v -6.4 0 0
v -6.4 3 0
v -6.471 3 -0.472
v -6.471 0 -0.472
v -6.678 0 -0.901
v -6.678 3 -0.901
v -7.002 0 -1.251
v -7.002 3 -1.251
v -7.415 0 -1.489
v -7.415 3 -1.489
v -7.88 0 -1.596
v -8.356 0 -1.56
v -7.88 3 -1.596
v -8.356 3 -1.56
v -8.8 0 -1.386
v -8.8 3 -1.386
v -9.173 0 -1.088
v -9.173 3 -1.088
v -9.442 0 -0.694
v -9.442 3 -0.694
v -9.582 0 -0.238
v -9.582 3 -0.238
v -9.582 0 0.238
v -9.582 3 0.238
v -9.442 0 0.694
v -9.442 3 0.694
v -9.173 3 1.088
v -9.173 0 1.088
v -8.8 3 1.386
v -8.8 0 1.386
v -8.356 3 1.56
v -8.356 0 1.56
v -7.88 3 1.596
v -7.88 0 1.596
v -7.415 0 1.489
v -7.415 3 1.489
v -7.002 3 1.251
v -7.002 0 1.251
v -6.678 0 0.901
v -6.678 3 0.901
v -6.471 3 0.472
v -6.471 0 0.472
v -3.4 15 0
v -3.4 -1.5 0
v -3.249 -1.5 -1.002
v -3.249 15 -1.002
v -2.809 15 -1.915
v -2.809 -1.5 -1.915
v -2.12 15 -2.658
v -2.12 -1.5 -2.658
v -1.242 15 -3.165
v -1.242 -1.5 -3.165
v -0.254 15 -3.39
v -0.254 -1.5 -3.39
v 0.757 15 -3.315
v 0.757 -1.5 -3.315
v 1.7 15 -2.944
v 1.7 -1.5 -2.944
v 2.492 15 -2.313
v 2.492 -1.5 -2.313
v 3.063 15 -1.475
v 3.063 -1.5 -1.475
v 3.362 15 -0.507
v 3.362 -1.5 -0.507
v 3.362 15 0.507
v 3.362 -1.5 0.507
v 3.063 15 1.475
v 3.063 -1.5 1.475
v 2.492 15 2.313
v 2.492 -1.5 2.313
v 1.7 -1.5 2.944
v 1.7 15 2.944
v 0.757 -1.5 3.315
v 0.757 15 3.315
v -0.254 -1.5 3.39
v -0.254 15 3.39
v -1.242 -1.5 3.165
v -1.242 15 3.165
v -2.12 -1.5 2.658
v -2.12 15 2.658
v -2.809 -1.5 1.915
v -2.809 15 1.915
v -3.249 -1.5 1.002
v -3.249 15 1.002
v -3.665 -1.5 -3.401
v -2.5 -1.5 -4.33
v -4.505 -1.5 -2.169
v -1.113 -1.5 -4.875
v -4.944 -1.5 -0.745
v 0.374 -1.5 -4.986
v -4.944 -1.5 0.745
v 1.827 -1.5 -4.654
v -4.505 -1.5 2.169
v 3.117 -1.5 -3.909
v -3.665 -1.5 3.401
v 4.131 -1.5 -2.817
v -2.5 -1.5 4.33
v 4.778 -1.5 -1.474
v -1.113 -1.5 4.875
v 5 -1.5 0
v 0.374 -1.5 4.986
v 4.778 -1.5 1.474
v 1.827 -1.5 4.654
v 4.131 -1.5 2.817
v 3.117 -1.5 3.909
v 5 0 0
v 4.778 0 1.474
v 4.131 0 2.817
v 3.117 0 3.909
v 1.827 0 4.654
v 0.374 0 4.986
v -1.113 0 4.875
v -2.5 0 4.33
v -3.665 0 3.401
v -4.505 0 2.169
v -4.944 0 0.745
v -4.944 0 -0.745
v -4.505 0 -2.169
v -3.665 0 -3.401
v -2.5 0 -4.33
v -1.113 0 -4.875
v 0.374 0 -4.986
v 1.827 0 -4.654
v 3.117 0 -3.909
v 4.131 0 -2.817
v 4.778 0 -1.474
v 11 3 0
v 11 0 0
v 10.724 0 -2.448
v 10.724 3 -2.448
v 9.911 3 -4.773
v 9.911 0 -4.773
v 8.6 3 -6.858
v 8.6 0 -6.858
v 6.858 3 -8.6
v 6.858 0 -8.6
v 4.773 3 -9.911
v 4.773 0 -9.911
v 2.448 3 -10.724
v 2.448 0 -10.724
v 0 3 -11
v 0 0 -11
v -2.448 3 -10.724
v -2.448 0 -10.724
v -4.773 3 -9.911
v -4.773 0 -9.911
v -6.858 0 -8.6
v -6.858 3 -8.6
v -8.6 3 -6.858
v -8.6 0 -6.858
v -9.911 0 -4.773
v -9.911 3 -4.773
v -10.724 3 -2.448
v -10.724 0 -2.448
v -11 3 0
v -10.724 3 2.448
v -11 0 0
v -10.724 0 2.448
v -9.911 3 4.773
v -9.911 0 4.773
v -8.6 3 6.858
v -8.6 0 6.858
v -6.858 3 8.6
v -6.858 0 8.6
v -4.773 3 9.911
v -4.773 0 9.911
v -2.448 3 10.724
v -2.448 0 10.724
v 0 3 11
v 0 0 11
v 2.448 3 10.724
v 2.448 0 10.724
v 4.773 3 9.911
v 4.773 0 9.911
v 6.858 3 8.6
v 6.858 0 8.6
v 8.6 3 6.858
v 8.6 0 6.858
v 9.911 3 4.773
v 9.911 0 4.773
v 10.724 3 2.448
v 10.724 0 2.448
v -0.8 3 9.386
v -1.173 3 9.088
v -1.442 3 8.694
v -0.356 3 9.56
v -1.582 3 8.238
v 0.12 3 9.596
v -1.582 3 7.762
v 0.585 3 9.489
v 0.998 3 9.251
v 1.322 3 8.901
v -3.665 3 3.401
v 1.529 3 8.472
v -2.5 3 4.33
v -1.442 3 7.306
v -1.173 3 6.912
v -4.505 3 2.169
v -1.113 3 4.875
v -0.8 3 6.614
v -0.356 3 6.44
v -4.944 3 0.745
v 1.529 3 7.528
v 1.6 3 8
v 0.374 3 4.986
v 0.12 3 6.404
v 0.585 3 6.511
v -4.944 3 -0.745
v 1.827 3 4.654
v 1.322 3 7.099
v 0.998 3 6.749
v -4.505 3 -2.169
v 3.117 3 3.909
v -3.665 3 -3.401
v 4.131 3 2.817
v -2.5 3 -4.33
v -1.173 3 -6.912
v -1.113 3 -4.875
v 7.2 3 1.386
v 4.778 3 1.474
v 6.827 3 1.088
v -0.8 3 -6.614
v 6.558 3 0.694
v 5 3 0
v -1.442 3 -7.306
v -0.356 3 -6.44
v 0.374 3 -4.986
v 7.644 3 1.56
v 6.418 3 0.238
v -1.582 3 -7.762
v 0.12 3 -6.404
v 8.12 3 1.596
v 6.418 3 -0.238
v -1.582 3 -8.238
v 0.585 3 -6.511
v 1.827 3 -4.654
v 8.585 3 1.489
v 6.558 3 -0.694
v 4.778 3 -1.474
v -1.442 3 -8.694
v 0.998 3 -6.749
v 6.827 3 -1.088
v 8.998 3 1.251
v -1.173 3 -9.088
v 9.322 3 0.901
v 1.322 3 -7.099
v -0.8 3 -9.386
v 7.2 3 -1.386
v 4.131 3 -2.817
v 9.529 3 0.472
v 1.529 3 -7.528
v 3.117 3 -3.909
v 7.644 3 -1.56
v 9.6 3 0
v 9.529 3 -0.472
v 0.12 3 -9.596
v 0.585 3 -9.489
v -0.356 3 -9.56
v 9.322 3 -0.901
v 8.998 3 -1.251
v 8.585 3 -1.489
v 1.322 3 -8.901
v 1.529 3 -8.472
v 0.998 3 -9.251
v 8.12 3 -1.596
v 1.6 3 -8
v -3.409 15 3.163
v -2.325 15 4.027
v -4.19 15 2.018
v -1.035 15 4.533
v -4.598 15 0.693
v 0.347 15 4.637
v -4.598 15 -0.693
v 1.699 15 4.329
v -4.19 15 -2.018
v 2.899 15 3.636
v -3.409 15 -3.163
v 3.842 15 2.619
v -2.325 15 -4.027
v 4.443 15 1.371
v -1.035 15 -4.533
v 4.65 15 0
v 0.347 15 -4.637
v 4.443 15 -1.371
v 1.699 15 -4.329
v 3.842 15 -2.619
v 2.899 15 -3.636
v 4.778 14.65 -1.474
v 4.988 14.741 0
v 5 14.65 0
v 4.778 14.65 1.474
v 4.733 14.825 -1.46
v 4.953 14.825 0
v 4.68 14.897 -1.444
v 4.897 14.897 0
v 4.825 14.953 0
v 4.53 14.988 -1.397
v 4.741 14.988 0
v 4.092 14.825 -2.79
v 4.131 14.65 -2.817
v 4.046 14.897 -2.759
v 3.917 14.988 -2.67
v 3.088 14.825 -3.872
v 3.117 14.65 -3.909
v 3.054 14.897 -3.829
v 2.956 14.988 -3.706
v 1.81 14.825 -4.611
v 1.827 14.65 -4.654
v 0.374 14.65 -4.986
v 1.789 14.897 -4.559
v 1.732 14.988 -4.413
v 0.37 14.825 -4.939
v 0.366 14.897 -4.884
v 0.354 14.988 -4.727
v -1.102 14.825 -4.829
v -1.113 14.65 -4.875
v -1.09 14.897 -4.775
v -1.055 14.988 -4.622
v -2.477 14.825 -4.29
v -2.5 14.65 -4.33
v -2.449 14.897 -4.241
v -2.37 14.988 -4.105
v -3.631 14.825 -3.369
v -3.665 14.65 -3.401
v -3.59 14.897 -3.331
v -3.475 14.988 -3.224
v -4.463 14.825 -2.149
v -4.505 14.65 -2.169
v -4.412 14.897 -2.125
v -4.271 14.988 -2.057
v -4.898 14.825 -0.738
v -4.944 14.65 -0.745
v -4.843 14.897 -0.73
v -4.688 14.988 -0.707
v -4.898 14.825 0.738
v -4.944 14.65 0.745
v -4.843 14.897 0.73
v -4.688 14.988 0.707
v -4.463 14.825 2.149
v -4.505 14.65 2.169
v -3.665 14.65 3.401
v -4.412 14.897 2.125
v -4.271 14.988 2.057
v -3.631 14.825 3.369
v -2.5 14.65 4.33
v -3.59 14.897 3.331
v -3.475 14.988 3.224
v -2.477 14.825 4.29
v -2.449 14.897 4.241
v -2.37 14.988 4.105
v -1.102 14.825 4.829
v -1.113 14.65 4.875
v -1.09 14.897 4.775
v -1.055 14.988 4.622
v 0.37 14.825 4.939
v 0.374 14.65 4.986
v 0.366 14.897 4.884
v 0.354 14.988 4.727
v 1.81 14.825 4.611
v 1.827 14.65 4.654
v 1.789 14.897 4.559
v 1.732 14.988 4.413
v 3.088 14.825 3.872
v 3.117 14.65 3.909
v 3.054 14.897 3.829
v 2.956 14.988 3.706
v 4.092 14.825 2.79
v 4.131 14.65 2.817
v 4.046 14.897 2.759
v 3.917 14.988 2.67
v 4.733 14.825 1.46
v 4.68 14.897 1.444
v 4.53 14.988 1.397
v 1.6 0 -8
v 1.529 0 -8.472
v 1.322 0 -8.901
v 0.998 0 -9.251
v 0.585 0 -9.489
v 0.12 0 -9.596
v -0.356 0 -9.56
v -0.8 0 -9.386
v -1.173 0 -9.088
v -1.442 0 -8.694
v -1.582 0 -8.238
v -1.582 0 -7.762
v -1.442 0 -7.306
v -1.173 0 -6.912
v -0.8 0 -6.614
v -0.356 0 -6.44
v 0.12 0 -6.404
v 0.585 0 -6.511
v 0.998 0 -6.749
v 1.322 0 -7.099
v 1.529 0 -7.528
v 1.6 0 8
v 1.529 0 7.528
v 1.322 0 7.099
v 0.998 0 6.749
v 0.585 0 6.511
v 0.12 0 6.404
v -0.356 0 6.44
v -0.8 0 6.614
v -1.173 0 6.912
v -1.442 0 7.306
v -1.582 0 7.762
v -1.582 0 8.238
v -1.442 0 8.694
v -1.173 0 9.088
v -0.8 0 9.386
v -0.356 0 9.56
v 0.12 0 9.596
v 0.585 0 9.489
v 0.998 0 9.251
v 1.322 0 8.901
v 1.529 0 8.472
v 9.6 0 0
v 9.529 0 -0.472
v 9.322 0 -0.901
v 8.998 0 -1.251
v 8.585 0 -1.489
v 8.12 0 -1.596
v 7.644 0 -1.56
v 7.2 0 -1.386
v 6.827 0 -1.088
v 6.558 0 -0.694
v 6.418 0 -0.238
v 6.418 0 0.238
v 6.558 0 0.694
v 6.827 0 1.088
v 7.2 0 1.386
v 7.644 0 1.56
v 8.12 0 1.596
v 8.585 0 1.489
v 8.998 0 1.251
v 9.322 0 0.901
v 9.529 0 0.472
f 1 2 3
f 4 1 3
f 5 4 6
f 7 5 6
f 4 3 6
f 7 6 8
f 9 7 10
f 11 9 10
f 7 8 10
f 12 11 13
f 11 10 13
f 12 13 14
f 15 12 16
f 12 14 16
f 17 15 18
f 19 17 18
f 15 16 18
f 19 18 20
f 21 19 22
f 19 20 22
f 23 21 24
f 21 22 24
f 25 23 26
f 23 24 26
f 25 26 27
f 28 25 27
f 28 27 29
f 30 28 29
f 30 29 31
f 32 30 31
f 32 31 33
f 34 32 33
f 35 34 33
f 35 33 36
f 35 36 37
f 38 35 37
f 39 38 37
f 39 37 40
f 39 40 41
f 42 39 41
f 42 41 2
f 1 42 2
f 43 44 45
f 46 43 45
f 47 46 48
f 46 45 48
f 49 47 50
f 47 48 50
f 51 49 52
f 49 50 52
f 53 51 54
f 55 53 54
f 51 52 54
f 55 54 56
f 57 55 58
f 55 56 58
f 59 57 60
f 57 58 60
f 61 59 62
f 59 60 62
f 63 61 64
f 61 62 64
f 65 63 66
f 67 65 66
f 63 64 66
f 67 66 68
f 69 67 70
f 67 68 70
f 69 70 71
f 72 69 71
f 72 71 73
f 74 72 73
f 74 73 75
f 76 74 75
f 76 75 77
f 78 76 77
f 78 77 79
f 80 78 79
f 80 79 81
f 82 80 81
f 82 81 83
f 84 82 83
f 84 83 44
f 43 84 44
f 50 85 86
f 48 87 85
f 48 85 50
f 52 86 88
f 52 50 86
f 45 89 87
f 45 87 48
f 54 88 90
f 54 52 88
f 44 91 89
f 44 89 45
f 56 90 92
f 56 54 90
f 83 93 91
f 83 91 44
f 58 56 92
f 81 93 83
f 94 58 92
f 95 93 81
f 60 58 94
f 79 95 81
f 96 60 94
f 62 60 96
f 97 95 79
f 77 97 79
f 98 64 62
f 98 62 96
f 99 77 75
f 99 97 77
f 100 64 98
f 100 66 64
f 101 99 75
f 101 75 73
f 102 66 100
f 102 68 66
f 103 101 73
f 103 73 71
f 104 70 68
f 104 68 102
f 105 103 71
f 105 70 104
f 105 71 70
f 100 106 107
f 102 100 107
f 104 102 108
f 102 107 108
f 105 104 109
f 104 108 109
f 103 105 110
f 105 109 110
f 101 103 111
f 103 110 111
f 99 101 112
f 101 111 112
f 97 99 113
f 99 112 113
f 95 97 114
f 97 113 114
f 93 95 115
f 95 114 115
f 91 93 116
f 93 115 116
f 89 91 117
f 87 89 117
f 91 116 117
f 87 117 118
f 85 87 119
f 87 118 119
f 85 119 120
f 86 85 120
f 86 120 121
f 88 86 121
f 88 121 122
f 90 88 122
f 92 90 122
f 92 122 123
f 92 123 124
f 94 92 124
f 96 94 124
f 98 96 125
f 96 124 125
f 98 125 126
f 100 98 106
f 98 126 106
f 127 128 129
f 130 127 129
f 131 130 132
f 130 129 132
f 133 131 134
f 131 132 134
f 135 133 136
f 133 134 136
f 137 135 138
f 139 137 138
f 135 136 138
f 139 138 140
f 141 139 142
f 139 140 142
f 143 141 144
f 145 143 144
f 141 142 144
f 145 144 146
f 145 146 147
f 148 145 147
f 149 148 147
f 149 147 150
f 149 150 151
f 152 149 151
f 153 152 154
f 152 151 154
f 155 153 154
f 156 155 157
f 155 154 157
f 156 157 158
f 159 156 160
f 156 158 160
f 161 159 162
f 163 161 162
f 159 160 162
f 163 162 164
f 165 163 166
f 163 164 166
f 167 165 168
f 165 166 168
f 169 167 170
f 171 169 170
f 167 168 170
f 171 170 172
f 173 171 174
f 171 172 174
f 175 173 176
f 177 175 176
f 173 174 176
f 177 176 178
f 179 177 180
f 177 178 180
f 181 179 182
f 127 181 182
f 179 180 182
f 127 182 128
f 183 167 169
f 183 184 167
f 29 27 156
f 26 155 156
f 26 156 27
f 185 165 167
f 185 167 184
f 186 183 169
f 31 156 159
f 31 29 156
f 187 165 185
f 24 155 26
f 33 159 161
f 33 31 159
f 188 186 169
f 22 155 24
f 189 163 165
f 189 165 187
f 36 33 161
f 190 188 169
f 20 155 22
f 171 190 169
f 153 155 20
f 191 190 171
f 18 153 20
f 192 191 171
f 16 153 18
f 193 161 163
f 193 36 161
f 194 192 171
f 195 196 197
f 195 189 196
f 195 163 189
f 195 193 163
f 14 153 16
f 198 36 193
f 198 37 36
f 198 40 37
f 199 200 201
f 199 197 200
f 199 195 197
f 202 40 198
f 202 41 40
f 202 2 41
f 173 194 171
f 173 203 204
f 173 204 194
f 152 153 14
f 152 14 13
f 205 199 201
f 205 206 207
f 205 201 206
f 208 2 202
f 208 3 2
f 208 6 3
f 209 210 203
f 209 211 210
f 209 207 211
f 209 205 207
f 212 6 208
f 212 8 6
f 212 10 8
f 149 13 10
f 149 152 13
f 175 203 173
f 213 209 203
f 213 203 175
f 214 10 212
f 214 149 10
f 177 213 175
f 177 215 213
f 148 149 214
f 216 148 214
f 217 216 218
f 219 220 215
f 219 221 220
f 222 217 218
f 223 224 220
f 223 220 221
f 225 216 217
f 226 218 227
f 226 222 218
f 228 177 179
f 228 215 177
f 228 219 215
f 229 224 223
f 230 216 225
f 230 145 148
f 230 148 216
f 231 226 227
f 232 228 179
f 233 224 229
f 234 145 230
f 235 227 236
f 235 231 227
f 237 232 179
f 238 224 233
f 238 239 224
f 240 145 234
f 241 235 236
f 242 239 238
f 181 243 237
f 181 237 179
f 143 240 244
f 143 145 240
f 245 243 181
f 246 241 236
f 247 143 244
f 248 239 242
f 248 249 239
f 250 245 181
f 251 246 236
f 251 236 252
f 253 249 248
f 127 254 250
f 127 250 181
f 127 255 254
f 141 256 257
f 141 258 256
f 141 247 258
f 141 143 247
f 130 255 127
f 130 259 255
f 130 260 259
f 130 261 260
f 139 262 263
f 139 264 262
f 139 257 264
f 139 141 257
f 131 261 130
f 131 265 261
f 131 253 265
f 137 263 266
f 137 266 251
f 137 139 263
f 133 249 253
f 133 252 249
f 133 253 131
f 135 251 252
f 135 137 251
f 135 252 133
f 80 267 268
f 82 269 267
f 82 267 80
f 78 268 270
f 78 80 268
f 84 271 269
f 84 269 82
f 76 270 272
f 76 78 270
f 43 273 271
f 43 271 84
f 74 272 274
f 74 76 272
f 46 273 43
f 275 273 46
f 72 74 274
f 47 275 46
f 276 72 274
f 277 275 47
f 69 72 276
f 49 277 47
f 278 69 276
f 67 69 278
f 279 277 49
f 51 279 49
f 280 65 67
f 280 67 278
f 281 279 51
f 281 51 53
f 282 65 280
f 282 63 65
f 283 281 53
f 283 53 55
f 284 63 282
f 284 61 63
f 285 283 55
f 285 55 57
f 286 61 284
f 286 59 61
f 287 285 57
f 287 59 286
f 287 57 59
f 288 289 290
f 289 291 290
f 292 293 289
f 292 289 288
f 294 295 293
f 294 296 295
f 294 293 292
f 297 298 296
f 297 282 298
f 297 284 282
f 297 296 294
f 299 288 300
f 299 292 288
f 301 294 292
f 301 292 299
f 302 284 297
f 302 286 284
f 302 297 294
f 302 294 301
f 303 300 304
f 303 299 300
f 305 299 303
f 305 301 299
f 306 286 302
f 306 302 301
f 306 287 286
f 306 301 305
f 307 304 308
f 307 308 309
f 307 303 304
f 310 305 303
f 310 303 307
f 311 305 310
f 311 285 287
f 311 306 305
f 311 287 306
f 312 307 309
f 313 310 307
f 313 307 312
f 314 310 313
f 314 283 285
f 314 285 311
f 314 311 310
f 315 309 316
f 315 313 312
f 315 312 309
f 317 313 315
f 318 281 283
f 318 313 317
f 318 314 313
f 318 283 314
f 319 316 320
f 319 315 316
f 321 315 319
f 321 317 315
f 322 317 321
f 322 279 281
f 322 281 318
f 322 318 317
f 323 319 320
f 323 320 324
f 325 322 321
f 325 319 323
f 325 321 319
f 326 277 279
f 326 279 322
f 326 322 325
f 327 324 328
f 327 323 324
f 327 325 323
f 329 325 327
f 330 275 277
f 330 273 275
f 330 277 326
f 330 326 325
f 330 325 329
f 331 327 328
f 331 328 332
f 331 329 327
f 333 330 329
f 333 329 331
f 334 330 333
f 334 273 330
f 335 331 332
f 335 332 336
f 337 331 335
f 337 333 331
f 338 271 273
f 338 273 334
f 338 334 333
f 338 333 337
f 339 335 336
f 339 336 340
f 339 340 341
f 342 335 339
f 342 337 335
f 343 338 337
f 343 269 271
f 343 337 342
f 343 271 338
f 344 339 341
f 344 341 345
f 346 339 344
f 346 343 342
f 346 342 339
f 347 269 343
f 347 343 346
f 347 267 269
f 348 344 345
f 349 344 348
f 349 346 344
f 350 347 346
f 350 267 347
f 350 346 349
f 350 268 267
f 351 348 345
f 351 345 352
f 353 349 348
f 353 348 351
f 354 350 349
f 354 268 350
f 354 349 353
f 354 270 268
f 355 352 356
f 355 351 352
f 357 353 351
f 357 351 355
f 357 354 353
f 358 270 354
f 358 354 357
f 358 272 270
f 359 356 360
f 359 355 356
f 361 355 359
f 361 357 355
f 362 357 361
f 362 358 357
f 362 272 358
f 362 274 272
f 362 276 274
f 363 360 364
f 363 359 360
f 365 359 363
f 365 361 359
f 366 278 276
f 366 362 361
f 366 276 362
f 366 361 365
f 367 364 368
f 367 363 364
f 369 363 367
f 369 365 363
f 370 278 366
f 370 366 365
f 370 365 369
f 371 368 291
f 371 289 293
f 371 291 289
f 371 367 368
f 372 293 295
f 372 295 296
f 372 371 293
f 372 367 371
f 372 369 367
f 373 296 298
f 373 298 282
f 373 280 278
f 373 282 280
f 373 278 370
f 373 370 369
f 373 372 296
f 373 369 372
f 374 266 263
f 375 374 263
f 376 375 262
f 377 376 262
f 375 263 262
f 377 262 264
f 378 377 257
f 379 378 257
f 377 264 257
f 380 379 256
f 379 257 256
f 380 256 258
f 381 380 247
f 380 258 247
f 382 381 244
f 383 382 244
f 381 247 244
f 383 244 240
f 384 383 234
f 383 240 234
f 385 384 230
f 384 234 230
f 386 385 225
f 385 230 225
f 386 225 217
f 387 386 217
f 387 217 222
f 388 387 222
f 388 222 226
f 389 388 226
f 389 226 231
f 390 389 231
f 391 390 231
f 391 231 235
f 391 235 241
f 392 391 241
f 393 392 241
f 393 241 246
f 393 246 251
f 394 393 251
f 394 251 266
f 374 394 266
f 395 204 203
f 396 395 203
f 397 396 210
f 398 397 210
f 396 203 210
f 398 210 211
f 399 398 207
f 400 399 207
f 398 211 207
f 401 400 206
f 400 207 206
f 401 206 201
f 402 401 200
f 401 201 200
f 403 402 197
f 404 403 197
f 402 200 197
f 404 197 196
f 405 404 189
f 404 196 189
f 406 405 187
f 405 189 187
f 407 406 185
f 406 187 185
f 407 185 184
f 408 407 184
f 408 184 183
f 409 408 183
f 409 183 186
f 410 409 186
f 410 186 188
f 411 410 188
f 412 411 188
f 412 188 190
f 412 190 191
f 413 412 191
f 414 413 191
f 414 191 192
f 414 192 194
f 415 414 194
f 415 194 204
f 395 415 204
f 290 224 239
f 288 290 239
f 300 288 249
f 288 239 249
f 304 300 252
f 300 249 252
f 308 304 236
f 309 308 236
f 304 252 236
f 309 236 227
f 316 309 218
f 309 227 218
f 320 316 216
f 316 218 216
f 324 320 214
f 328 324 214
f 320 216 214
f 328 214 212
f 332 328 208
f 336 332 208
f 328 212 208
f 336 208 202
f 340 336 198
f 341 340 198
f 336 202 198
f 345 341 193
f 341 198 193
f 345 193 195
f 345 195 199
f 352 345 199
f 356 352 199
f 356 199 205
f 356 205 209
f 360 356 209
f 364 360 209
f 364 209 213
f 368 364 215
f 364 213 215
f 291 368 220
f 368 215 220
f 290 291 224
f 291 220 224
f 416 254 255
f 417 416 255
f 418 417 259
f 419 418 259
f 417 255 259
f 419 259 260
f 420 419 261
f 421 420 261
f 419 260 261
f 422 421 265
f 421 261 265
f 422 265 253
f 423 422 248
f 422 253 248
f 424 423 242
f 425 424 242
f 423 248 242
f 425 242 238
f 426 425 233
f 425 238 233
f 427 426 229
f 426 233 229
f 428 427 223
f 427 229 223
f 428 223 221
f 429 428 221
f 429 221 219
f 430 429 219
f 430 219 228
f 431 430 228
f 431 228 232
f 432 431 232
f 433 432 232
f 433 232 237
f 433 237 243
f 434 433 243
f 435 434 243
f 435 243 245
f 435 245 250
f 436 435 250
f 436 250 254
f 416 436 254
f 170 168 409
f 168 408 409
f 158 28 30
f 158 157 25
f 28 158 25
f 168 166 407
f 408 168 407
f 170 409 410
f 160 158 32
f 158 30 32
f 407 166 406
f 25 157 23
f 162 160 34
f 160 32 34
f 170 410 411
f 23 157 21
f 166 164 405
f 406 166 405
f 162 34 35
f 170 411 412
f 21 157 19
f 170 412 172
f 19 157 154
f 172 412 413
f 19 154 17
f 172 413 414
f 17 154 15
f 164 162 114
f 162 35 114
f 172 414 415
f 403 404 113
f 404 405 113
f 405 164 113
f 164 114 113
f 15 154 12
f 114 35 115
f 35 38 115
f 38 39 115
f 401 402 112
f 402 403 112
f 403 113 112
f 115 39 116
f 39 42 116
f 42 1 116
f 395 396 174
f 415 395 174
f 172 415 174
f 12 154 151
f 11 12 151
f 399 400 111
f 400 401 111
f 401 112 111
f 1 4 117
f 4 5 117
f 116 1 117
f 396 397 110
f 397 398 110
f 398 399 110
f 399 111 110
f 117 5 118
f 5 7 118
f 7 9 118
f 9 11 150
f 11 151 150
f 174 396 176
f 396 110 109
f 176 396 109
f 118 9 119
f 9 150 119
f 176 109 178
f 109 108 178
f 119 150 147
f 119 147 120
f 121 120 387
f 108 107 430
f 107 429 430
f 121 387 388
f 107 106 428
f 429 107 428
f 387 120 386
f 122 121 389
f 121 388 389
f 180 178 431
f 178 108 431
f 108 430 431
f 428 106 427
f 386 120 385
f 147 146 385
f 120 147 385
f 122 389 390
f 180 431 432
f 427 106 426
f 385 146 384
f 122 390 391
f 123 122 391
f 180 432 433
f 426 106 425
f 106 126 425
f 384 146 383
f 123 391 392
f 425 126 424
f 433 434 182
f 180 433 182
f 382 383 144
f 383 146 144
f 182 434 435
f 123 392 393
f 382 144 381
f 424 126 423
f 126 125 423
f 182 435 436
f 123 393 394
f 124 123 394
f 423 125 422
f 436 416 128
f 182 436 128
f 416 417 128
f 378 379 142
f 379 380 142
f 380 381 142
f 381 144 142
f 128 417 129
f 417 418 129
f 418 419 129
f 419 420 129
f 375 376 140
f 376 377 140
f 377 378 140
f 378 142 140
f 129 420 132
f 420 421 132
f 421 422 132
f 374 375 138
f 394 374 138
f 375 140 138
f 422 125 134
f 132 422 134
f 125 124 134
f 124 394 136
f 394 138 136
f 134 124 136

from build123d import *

# Parameters (mm, degrees)
SKETCH_1_R          = 11
EXTRUDE_1_DEPTH     = 3
SKETCH_2_R          = 5
EXTRUDE_2_DEPTH     = 12
SKETCH_5_R          = 1.6
CUT_EXTRUDE_3_DEPTH = 4
FILLET_1_R          = 0.35
SKETCH_7_R          = 5
EXTRUDE_3_DEPTH     = 1.5
HOLE_WIZARD_M8_1_D  = 6.8


with BuildPart() as part:
    # 草图1 → 凸台-拉伸1 (new body)
    with BuildSketch(Plane(origin=(0, 0, 0), x_dir=(1, 0, 0), z_dir=(0, 1, 0))):
        Circle(SKETCH_1_R)
    extrude(amount=EXTRUDE_1_DEPTH)

    # 草图2 → 凸台-拉伸2 (add)
    with BuildSketch(Plane(origin=(0, 3, 0), x_dir=(1, 0, 0), z_dir=(0, 1, 0))):
        Circle(SKETCH_2_R)
    extrude(amount=EXTRUDE_2_DEPTH)

    # 草图5 → 切除-拉伸3 (cut, through all)
    with BuildSketch(Plane(origin=(0, 3, 0), x_dir=(1, 0, 0), z_dir=(0, 1, 0))):
        with Locations((0, 8)):
            Circle(SKETCH_5_R)
        with Locations((8, 0)):
            Circle(SKETCH_5_R)
        with Locations((0, -8)):
            Circle(SKETCH_5_R)
        with Locations((-8, 0)):
            Circle(SKETCH_5_R)
    extrude(amount=-CUT_EXTRUDE_3_DEPTH, mode=Mode.SUBTRACT)

    # 圆角1
    fillet_1_edges = [part.edges().sort_by_distance(p)[0] for p in [
        (-5, 15, 0),
    ]]
    fillet(fillet_1_edges, radius=FILLET_1_R)

    # 草图7 → 凸台-拉伸3 (add)
    with BuildSketch(Plane.XZ):
        Circle(SKETCH_7_R)
    extrude(amount=EXTRUDE_3_DEPTH)

    # M8 螺纹孔1 (through all)
    with Locations(Plane(origin=(0, 15, 0), x_dir=(1, 0, 0), z_dir=(0, 1, 0))):
        with Locations((0, 0)):
            Hole(HOLE_WIZARD_M8_1_D / 2)


solid = part.part
